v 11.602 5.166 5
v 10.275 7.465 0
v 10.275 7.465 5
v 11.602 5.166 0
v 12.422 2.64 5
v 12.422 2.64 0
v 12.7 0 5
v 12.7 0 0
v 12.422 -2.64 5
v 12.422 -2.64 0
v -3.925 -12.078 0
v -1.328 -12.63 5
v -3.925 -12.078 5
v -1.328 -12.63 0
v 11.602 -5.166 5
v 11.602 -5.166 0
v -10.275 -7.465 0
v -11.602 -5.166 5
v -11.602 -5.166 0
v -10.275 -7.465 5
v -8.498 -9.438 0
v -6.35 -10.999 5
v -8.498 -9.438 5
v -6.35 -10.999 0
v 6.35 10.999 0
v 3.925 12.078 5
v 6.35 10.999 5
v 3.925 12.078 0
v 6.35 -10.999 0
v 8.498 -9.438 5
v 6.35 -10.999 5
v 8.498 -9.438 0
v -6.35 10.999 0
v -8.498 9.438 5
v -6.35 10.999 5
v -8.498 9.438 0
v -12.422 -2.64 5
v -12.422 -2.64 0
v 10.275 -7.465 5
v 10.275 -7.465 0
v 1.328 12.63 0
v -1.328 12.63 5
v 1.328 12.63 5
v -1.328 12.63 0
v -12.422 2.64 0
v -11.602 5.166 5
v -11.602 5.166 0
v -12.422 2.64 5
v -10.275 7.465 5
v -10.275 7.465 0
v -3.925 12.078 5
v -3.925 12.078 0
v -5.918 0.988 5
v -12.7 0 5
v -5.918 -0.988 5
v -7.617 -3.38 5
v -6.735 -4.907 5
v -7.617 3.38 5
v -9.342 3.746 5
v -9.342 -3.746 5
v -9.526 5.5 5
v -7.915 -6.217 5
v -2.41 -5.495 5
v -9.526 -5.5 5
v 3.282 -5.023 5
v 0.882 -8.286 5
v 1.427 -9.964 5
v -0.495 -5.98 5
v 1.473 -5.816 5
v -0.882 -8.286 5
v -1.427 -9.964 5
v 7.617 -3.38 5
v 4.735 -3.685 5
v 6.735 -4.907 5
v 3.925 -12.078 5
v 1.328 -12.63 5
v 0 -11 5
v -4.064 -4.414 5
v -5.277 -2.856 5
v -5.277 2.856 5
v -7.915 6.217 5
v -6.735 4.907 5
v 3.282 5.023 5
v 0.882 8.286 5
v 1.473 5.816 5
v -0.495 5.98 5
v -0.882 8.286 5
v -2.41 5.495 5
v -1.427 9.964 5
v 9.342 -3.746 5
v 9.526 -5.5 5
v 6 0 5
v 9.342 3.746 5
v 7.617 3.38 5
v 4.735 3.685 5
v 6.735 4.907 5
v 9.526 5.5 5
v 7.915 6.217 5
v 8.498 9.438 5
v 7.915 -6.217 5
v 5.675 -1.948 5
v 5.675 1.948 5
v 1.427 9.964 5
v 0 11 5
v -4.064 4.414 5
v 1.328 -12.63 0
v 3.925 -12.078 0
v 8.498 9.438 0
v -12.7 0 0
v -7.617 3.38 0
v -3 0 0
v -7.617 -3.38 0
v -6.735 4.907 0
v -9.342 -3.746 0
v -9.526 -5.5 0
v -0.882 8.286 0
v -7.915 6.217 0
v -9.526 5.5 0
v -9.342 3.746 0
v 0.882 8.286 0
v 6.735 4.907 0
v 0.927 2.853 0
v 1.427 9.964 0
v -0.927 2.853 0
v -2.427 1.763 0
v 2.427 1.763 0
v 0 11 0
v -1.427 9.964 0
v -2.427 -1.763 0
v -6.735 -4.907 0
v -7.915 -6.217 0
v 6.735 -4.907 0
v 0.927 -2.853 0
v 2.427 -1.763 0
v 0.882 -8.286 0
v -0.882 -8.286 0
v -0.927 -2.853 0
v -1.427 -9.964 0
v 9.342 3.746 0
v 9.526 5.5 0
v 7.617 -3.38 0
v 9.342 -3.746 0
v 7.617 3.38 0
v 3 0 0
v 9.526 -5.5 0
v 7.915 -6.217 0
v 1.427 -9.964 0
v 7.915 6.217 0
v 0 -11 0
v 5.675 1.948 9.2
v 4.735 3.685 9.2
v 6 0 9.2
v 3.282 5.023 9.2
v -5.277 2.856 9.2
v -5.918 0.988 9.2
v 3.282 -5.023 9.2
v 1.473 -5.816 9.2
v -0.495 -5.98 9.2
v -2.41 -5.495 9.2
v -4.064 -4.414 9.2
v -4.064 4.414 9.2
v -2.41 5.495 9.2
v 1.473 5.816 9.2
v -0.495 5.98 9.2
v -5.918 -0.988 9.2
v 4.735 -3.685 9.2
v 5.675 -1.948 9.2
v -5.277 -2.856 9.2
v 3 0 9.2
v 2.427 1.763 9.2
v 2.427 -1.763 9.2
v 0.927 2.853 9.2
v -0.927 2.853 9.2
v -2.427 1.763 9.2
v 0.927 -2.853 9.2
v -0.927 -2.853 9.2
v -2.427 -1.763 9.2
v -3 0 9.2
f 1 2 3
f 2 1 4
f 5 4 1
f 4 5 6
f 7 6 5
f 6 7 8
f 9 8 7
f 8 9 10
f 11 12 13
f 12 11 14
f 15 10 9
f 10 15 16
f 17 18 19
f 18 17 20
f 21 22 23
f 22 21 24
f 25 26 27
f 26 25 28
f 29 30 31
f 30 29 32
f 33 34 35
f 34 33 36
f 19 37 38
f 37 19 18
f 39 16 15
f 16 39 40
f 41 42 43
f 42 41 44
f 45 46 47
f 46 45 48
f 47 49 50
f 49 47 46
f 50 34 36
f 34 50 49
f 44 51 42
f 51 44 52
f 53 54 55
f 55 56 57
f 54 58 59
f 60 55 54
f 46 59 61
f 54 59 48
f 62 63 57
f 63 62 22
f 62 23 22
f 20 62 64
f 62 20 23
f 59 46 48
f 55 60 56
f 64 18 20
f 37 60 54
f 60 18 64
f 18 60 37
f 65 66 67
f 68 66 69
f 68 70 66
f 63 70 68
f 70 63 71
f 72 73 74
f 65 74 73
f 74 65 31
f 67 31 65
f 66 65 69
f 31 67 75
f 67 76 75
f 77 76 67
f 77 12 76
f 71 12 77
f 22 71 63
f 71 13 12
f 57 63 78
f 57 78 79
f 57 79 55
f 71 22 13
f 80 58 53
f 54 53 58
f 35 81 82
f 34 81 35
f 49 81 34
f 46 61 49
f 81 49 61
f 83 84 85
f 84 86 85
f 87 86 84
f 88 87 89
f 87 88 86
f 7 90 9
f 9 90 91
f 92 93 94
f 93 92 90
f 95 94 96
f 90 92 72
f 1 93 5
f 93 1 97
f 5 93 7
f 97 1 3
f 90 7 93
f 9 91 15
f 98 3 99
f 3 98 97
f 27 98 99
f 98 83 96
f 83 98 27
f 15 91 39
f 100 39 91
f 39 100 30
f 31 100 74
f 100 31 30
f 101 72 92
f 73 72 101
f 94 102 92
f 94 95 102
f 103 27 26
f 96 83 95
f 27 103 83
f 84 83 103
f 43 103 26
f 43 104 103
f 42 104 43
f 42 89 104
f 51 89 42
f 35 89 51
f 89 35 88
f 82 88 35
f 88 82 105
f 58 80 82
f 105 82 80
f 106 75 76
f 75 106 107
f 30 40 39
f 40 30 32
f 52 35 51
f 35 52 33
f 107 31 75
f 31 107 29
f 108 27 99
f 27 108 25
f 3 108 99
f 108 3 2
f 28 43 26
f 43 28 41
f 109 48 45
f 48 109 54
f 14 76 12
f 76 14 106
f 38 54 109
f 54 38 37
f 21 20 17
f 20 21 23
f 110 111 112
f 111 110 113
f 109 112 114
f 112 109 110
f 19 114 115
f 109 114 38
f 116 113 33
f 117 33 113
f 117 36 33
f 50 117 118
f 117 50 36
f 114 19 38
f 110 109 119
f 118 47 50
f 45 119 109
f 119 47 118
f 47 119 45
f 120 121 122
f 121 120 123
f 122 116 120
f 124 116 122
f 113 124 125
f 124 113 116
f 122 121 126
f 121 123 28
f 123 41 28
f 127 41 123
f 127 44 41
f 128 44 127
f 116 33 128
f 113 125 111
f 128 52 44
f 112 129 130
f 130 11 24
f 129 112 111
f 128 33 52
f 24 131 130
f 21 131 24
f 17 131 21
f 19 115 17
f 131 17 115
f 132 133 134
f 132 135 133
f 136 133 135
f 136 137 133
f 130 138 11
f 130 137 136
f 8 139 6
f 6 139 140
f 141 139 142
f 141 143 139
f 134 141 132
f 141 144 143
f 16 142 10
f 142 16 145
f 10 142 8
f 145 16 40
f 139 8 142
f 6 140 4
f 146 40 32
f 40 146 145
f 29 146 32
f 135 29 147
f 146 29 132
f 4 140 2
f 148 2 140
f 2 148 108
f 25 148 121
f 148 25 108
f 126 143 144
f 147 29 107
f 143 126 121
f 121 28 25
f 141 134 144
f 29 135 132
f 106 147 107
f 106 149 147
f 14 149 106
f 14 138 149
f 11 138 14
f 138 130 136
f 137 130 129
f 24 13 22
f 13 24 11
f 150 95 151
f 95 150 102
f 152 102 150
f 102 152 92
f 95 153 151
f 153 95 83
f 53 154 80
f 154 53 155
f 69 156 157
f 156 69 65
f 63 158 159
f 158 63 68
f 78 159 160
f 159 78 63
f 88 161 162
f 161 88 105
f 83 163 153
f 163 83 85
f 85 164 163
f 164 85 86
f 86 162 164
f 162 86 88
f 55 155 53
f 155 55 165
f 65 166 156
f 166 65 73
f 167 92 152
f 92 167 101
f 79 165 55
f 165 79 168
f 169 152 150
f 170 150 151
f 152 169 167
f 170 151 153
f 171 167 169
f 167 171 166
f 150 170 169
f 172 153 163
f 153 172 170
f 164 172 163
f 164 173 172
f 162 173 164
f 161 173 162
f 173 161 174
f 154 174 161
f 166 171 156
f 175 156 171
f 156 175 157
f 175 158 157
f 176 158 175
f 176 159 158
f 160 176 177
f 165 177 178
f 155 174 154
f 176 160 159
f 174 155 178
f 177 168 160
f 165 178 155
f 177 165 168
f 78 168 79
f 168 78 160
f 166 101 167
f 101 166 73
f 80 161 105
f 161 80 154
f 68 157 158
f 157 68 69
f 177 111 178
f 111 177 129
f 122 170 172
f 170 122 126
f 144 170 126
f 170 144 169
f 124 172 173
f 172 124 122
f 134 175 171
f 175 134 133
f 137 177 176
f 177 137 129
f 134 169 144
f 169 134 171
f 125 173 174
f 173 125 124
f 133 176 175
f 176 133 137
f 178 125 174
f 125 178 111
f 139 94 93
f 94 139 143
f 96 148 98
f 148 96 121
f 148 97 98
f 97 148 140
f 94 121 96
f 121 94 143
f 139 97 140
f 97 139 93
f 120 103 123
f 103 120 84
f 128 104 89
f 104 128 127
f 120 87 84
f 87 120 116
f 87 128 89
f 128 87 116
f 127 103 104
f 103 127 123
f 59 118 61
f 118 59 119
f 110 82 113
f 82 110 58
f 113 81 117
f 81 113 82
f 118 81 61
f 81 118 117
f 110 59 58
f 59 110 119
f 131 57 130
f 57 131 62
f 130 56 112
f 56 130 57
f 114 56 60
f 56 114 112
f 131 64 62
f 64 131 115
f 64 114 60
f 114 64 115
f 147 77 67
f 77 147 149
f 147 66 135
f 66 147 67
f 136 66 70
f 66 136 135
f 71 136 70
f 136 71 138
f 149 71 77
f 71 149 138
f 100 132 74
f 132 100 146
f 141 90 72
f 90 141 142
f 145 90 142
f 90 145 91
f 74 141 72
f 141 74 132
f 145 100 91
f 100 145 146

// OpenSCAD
function hubLargeRadius() = 25.4 / 2;
large_height = 5;
small_radius = 6;
small_height = 4.2;
inner_radius = 3;
mounting_hole_radius = 1.5;
mounting_hole_spacing = 9.5;

shaft_mounting_hub();

module shaft_mounting_hub() {
	color("Silver")
	difference() {
		difference() {
			union() {
				cylinder(r=hubLargeRadius(), h=large_height);
				translate([0,0,large_height]) {
					cylinder(r=small_radius, h=small_height);
				}
			}
			cylinder(r=inner_radius, h=small_height + large_height);
		}
		mounting_holes();
	}
}

module mounting_holes() {
	for (i = [0:5]){
		rotate([0, 0, 30 + 60 * i]) {
			translate([mounting_hole_spacing, 0, 0]){
				cylinder(r=1.5, h=12);
			}
		}
	}
}
